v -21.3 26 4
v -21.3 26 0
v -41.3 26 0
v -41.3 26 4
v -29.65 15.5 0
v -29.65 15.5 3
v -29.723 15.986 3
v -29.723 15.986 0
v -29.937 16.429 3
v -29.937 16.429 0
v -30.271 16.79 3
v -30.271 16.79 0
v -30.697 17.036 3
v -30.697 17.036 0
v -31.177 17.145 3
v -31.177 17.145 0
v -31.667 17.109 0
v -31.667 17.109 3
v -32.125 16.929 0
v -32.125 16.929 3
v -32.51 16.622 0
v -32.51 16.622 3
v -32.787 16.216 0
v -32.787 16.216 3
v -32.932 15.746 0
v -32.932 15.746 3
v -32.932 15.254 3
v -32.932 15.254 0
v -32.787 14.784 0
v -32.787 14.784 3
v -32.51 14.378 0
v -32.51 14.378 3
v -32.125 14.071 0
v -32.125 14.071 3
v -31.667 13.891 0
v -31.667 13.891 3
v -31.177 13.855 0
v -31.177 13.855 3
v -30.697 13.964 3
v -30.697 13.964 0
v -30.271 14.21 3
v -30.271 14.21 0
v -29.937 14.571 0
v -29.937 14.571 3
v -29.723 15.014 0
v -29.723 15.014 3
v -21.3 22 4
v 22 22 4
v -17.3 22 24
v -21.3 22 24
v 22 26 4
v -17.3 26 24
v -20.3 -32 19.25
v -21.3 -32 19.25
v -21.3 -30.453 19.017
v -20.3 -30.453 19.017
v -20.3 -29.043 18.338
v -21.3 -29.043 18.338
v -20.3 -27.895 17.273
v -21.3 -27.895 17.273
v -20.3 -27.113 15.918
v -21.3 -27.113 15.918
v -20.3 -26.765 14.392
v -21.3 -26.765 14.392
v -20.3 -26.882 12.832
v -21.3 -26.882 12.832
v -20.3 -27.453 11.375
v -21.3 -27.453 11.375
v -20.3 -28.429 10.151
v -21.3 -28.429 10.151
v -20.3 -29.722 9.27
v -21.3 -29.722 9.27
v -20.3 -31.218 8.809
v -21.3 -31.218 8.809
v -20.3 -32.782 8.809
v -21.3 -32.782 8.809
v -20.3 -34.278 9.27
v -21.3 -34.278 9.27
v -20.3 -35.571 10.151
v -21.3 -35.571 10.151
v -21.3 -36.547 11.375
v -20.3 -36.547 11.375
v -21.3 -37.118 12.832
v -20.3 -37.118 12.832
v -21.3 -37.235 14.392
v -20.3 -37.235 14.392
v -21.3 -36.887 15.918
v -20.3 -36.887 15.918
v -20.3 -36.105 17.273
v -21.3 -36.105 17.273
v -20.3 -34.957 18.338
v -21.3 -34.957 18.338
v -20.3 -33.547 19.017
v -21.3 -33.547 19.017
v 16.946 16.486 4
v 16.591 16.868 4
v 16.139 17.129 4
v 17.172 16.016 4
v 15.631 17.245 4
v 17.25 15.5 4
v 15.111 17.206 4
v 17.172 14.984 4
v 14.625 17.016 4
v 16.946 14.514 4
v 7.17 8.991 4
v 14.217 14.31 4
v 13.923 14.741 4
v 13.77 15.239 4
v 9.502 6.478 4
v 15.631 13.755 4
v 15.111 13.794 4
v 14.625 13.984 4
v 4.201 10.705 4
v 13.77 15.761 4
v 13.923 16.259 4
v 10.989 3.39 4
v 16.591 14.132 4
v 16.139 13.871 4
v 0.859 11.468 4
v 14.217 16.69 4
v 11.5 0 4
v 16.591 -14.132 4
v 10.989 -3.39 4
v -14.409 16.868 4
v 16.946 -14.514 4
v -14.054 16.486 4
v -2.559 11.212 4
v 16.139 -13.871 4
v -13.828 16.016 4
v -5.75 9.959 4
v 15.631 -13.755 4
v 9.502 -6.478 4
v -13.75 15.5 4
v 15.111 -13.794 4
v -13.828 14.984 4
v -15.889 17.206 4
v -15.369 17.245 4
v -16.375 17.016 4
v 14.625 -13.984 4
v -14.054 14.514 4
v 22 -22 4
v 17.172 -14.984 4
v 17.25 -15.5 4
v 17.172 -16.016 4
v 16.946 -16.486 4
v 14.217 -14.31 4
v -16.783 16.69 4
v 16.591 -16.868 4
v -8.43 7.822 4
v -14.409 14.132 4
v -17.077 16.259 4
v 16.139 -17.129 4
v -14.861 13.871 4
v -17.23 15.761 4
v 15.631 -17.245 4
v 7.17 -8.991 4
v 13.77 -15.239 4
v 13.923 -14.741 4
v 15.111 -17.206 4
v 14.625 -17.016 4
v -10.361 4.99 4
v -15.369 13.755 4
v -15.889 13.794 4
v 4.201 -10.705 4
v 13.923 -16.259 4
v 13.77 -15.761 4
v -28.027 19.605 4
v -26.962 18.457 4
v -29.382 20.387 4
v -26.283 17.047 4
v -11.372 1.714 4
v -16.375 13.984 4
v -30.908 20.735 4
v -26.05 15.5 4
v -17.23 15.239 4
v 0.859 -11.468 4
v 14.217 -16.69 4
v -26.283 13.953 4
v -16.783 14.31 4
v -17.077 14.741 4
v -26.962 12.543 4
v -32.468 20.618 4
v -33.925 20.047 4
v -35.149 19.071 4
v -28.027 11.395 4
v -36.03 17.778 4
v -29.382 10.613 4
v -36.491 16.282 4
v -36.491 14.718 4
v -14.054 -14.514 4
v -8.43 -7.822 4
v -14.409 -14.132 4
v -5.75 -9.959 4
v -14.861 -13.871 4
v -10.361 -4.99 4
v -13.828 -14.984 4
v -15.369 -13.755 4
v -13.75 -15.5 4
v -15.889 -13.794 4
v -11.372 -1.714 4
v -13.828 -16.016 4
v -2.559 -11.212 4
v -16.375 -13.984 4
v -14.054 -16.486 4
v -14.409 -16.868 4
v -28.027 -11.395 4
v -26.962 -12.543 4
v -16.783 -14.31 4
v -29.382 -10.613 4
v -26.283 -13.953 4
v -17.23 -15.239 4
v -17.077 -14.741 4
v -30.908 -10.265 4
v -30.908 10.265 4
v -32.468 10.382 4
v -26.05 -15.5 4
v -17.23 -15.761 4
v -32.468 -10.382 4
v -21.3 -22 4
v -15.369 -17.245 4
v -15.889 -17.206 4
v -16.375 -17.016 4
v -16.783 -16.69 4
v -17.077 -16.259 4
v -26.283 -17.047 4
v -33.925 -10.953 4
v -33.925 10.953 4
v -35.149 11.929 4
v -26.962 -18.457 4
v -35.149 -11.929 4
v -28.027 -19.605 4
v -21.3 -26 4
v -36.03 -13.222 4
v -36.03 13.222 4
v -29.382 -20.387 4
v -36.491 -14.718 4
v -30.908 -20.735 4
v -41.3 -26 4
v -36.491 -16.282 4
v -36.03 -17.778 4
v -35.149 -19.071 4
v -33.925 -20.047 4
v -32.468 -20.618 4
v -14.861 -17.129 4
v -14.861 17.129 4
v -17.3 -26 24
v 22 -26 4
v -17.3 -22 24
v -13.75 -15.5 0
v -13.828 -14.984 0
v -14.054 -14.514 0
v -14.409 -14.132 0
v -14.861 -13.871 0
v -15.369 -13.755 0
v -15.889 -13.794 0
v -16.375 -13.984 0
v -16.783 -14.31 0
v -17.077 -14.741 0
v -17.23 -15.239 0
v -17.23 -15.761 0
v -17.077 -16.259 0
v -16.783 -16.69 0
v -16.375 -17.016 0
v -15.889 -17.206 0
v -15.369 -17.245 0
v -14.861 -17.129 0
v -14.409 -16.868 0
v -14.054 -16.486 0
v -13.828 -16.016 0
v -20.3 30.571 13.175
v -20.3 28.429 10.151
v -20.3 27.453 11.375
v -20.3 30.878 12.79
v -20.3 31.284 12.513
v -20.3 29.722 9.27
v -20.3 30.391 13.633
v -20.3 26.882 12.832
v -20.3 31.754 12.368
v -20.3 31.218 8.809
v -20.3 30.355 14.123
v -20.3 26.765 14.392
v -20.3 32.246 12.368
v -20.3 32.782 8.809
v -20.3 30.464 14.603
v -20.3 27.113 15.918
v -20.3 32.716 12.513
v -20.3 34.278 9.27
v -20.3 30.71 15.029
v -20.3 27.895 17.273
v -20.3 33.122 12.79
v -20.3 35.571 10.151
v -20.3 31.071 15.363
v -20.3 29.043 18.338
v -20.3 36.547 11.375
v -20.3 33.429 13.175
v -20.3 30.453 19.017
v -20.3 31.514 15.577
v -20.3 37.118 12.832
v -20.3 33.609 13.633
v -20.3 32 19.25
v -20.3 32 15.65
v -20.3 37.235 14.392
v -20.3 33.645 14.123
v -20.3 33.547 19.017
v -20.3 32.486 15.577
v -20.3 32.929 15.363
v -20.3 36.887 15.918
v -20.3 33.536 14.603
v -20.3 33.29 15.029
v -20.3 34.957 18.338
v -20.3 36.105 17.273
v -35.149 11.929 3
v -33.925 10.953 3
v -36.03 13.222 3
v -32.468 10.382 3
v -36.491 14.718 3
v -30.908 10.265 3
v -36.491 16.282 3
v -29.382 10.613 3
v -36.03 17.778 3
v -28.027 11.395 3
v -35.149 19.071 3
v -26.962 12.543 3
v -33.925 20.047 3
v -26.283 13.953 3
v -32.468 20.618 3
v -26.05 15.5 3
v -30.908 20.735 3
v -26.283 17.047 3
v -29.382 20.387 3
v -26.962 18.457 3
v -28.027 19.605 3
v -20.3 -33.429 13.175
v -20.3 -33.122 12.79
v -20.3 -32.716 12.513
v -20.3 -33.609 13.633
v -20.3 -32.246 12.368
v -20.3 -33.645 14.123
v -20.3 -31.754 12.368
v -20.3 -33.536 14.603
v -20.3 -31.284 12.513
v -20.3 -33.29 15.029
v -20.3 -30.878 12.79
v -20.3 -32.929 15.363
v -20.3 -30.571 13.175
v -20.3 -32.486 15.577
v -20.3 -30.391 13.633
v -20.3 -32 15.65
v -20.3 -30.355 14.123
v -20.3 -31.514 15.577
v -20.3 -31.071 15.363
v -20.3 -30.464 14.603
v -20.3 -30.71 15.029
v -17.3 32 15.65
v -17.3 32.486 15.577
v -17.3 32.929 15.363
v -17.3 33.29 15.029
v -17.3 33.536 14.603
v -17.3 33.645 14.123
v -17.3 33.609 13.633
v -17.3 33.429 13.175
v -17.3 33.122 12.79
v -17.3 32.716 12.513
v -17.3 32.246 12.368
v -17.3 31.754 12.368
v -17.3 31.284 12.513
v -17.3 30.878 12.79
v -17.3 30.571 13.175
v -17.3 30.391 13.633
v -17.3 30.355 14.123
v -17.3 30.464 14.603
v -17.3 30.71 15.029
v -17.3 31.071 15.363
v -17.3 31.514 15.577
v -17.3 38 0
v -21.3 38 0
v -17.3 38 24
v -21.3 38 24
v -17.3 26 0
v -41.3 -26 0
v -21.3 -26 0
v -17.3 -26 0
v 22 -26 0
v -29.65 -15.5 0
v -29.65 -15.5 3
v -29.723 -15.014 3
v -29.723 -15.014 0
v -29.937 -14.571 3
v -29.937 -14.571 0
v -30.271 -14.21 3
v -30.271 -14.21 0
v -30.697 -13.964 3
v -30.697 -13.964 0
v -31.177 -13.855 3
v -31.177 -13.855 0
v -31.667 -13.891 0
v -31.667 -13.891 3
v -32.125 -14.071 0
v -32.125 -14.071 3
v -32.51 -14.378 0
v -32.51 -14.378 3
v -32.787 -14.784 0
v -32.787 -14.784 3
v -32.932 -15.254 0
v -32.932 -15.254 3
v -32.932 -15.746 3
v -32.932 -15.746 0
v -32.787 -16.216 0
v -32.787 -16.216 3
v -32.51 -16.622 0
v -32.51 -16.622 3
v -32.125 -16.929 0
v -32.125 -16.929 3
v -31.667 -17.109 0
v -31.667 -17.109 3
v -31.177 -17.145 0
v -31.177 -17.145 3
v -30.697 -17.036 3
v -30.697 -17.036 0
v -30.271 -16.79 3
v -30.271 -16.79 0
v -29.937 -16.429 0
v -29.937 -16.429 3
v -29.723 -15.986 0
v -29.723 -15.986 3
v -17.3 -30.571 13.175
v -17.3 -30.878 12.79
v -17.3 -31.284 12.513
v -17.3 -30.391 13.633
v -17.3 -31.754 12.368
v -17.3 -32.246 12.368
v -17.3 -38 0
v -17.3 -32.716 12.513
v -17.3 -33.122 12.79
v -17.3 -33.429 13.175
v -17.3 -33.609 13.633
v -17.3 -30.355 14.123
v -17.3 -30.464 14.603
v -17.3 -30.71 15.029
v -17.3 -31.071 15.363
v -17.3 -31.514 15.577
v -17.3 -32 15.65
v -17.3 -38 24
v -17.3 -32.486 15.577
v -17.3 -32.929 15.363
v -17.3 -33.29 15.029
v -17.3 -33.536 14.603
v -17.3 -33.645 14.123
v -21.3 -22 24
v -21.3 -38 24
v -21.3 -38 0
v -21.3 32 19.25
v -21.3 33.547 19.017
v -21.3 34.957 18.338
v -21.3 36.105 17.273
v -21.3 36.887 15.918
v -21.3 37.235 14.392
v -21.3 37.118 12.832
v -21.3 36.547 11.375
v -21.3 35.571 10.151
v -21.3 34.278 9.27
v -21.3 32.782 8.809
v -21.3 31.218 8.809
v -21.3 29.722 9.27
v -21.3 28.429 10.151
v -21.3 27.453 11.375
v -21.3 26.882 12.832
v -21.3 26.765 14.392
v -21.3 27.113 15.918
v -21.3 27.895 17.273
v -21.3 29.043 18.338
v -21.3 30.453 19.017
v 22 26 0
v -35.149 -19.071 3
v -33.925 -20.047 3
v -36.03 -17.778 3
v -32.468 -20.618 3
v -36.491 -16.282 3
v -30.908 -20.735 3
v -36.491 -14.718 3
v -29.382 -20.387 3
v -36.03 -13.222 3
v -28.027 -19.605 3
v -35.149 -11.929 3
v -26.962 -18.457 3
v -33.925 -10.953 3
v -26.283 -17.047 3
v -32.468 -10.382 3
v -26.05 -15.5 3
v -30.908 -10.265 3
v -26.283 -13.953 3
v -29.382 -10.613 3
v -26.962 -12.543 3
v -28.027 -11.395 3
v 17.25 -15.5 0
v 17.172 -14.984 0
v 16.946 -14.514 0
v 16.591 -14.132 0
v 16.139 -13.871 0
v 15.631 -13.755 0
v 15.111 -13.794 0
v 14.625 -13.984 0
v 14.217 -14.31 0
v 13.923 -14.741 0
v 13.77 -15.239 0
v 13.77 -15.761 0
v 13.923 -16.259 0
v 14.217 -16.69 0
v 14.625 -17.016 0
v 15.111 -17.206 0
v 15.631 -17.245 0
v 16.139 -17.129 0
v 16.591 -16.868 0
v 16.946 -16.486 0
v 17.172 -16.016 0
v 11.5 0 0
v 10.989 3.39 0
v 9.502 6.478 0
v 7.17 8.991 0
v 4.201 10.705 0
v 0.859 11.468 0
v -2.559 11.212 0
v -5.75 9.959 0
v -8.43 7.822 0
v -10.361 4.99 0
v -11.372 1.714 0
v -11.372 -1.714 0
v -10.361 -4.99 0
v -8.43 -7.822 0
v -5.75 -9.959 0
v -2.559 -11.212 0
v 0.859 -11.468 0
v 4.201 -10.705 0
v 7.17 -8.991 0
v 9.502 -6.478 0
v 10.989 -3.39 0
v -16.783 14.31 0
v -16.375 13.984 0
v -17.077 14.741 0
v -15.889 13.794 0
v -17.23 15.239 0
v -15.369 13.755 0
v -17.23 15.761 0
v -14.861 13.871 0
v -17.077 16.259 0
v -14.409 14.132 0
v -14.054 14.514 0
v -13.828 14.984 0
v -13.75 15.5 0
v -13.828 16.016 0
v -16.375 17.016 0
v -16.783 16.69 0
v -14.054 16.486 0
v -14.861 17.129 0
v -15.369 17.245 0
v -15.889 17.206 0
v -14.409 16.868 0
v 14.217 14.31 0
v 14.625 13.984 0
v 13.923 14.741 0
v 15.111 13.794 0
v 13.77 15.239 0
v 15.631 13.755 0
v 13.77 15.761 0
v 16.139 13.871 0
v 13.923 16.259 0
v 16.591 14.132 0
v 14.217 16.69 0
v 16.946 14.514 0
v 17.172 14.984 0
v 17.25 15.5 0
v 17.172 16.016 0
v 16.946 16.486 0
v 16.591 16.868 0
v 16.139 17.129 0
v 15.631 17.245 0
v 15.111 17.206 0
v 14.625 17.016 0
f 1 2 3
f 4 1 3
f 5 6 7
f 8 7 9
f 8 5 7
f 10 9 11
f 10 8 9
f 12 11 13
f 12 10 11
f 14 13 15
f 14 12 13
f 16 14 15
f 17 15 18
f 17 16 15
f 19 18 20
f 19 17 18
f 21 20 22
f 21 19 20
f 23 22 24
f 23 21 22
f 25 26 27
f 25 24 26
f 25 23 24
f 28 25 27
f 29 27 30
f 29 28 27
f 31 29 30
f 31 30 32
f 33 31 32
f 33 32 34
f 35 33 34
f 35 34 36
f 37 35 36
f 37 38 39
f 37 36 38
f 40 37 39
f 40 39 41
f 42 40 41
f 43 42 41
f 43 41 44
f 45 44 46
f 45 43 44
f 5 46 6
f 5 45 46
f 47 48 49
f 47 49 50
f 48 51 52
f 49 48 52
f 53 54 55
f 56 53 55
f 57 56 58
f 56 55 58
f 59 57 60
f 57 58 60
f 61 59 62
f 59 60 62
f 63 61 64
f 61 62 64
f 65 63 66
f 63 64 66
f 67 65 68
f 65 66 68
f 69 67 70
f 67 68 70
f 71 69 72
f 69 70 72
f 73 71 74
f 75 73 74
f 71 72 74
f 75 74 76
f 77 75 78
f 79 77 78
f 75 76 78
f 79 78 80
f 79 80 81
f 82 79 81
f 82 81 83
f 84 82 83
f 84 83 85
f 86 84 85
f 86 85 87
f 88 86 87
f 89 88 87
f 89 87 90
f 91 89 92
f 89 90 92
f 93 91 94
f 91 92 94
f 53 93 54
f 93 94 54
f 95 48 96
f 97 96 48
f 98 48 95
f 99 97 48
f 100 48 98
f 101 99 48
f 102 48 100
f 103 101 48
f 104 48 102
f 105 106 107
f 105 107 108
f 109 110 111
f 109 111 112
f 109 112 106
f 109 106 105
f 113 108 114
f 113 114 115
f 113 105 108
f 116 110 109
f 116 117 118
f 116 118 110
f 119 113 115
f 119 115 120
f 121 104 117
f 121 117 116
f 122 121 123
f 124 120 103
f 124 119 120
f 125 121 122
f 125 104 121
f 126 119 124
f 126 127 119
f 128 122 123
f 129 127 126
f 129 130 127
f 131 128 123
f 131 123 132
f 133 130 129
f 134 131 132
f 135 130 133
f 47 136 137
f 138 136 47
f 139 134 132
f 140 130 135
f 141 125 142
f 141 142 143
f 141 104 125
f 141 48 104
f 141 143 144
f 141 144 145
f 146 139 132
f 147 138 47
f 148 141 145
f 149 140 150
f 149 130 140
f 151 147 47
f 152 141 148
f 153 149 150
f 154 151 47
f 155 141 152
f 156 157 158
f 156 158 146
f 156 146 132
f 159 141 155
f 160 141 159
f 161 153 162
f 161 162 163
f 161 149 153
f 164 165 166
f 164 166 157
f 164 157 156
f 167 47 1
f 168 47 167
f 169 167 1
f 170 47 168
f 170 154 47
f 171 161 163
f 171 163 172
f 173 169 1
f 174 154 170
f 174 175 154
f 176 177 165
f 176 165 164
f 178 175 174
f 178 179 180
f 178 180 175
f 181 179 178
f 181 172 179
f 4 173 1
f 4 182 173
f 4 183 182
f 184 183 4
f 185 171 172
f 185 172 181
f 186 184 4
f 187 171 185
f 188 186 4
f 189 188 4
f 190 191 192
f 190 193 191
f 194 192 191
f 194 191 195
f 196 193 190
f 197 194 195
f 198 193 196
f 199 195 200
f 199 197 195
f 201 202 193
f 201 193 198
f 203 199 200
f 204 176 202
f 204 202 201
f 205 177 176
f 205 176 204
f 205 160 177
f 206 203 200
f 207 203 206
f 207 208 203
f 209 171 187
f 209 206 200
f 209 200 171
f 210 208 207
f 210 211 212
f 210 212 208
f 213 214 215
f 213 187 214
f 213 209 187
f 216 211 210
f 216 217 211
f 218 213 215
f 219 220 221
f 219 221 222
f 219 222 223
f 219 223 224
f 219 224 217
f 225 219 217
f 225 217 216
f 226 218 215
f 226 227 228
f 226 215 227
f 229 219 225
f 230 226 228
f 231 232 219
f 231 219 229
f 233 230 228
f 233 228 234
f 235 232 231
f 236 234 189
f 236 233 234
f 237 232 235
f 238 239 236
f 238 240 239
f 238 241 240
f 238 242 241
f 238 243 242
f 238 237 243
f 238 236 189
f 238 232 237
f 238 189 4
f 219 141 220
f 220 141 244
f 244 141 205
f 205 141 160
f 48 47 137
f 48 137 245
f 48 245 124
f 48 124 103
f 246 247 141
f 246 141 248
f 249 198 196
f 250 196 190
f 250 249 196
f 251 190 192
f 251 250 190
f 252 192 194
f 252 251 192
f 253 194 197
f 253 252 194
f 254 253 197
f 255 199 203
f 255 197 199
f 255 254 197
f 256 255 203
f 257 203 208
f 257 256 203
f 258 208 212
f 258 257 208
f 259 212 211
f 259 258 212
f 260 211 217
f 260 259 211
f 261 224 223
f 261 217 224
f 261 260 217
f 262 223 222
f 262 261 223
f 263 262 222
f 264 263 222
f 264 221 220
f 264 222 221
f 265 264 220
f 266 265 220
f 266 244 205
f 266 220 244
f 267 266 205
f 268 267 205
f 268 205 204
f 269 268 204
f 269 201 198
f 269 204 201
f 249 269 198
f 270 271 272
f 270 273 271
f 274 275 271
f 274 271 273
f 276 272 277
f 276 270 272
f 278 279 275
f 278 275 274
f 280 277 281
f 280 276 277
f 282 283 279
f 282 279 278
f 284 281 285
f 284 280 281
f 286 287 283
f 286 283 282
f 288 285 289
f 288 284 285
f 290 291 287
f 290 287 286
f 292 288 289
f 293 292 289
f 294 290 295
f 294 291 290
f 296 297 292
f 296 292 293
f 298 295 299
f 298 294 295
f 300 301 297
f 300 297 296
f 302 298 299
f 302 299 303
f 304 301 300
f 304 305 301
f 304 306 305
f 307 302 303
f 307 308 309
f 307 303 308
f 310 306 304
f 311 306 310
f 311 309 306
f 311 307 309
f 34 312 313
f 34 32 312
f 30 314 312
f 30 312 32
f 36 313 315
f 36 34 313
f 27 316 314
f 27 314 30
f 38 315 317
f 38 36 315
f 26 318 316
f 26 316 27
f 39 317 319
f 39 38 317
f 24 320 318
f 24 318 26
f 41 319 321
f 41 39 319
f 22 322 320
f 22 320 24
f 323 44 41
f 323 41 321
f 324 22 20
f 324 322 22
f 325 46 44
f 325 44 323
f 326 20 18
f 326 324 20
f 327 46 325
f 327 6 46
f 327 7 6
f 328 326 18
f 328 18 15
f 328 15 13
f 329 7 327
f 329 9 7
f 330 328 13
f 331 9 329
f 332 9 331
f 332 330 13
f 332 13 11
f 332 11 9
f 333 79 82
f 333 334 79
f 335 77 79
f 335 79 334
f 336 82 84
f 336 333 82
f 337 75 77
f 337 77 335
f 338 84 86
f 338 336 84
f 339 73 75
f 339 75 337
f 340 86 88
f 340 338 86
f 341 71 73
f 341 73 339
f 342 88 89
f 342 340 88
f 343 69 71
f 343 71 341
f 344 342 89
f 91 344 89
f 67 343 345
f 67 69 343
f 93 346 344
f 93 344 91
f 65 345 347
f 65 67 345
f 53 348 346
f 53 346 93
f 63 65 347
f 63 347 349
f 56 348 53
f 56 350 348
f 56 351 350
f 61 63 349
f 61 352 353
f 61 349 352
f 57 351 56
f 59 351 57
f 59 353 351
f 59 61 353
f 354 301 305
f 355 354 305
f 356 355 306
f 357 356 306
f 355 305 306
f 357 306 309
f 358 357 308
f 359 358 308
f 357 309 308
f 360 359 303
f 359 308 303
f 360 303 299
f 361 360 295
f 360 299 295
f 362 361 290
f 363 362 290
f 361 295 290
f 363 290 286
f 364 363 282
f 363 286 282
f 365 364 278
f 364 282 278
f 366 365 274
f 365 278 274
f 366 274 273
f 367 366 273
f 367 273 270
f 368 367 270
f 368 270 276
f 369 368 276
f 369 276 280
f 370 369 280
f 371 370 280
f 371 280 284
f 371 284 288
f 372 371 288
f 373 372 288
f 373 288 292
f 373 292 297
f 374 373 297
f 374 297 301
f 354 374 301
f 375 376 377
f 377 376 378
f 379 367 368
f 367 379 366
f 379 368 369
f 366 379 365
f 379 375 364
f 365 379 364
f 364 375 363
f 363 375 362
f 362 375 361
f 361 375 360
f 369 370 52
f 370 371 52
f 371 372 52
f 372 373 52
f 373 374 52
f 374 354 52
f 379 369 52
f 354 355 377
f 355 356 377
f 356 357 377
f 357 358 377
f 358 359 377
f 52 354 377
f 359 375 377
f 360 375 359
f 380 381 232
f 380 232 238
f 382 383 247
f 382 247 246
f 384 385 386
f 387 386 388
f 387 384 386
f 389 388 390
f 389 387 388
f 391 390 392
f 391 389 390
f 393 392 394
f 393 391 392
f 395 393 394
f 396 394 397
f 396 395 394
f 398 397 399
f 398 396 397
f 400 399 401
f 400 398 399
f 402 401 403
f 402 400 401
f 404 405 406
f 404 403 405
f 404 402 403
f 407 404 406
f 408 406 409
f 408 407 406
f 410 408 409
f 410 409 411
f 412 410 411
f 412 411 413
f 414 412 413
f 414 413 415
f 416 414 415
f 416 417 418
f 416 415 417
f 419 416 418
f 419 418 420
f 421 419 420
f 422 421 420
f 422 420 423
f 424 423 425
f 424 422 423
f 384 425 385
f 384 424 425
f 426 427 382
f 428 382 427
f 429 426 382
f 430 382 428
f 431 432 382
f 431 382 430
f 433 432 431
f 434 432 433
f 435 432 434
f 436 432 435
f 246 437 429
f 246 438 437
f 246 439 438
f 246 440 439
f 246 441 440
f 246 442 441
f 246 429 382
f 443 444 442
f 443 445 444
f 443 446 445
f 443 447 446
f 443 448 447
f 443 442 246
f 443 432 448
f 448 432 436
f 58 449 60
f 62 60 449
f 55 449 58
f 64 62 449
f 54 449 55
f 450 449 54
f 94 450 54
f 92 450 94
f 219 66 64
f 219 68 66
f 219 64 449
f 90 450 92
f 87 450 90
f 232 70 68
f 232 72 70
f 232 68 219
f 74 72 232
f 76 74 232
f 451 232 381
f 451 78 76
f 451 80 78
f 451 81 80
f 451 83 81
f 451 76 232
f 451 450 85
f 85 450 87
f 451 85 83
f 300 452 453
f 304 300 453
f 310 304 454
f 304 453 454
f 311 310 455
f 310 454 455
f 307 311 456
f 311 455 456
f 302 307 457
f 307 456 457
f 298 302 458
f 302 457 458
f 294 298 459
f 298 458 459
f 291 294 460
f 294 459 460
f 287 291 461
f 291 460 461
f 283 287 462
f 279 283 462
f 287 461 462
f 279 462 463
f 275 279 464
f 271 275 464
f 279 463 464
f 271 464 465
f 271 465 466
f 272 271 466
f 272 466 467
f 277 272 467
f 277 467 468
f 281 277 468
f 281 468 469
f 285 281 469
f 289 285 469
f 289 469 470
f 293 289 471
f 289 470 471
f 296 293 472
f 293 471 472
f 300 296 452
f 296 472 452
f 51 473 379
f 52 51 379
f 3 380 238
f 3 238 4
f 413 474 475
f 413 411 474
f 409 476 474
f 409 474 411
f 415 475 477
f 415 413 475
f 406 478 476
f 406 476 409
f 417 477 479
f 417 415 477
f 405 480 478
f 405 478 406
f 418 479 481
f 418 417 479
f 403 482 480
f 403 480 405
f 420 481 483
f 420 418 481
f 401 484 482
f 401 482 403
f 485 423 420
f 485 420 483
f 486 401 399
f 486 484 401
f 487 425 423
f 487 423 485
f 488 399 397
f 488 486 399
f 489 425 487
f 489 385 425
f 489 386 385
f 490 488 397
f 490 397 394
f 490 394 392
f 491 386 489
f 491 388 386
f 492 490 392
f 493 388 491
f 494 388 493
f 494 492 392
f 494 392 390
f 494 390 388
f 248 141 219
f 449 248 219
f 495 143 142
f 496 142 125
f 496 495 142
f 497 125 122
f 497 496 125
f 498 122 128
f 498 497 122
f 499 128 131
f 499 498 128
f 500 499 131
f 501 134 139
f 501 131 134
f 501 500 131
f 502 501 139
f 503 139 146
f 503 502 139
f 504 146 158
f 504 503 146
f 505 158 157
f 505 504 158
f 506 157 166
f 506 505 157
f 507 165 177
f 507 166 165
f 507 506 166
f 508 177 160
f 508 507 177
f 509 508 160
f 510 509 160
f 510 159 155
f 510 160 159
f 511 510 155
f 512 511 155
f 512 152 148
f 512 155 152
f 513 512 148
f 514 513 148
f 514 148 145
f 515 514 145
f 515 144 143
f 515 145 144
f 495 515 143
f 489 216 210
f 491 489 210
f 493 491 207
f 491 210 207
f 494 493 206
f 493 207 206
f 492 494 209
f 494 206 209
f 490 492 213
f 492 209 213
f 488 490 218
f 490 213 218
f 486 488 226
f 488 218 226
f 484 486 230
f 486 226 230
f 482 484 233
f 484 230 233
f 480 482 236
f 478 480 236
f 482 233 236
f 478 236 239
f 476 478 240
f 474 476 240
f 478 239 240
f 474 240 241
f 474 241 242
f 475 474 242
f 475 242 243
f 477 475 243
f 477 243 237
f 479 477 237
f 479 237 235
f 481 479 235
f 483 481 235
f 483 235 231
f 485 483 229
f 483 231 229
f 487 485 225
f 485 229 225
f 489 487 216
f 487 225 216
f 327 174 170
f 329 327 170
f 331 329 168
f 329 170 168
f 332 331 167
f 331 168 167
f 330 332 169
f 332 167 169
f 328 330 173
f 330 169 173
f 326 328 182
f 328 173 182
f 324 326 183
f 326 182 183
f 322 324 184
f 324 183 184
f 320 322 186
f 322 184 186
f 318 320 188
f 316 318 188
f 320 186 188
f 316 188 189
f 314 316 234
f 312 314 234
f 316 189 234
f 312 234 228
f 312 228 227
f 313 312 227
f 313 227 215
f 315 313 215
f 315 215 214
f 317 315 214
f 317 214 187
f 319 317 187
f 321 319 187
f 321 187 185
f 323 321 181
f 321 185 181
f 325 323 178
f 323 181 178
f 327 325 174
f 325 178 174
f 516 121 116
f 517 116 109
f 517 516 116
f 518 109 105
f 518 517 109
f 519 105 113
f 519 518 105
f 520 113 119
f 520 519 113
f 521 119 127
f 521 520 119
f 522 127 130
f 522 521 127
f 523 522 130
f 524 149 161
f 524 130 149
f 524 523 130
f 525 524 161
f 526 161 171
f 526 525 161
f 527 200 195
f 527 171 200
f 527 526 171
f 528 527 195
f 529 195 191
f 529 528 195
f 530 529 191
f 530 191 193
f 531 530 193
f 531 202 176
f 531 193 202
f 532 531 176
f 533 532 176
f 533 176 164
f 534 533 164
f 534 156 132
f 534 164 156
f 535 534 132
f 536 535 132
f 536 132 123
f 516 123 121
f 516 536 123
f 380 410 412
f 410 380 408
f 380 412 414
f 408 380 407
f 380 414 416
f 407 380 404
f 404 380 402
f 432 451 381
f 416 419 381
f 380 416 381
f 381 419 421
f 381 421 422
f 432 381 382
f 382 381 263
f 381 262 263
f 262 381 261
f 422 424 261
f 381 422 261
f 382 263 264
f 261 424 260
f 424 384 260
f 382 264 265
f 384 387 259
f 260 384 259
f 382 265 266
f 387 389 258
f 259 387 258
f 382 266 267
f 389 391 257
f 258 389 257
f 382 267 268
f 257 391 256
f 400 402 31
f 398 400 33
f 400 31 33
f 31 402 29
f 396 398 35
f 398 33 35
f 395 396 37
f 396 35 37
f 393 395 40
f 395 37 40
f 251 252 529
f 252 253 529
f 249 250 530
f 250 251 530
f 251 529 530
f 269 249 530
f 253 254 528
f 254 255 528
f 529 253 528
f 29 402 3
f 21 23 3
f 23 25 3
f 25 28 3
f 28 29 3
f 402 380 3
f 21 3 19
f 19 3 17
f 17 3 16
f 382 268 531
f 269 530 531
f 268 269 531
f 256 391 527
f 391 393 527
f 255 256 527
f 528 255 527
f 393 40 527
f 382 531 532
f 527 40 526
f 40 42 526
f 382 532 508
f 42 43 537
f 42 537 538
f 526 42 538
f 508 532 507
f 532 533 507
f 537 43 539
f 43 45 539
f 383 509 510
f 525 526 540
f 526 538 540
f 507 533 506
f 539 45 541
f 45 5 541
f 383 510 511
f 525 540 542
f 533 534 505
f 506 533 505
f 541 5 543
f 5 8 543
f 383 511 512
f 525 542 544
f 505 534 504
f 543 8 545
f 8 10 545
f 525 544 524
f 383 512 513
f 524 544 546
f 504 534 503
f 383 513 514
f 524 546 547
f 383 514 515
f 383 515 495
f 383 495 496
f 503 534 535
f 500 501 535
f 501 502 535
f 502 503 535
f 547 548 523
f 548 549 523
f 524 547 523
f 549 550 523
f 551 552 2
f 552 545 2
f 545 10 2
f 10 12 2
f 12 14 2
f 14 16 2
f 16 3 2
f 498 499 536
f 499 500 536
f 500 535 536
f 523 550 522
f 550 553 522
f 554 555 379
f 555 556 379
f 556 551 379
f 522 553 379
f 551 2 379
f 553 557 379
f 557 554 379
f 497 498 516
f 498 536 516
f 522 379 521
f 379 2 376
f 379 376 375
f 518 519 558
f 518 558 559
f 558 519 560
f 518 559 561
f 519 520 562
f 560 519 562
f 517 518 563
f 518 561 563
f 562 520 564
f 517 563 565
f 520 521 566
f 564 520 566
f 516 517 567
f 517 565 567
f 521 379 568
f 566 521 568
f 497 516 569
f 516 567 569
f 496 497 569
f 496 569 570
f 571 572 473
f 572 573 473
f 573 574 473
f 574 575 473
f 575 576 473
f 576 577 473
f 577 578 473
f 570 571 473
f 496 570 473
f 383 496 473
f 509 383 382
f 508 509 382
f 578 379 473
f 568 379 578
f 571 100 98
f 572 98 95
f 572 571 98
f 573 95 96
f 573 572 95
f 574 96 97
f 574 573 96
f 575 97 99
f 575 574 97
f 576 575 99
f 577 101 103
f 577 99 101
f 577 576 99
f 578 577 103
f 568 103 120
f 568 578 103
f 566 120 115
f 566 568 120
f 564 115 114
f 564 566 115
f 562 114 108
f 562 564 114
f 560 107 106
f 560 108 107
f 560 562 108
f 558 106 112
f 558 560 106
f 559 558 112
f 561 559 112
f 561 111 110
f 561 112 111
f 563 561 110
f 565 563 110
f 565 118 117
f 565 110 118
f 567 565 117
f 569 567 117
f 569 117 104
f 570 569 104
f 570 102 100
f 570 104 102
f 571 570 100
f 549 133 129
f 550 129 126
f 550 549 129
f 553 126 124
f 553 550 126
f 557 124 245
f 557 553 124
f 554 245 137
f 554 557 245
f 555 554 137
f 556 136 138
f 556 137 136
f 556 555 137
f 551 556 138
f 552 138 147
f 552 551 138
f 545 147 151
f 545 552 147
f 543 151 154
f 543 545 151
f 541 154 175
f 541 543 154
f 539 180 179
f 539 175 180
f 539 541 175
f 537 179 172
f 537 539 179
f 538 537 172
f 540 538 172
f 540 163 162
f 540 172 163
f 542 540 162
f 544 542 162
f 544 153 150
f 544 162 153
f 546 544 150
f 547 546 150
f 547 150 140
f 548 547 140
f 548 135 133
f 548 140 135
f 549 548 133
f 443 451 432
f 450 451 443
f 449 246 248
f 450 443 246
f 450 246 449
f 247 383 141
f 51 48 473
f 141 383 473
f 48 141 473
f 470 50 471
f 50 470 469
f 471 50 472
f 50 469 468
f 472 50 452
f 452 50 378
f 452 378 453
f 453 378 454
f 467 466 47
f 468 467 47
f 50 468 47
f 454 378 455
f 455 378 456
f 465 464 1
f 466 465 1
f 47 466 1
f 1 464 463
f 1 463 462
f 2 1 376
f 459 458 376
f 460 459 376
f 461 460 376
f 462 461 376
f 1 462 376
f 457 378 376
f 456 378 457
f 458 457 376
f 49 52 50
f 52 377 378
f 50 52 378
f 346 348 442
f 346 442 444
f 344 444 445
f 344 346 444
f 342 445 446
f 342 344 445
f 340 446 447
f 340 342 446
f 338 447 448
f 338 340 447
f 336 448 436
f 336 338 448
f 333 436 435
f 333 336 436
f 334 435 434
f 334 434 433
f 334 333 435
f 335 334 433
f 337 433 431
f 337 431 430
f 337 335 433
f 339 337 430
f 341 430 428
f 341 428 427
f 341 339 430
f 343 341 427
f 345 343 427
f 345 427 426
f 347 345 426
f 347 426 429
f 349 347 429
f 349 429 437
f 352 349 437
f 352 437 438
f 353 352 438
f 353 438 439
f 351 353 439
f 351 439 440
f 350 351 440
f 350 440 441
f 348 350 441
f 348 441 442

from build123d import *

# Parameters (mm, degrees)
ESBO_O1_W                  = 63.3
ESBO_O1_H                  = 52
ESBO_O1_R                  = 11.5
ESBO_O1_R_2                = 1.75
ESBO_O1_R_3                = 1.65
RESSALTO_EXTRUS_O1_DEPTH   = 25
ESBO_O2_W                  = 13.3
ESBO_O2_H                  = 21
CORTE_EXTRUS_O1_DEPTH      = 27
CORTE_EXTRUS_O1_DEPTH_BACK = 27
RESSALTO_EXTRUS_O2_DEPTH   = 4
ESBO_O4_W                  = 24
ESBO_O4_H                  = 16
ESBO_O4_R                  = 1.65
RESSALTO_EXTRUS_O3_DEPTH   = 4
ESBO_O5_R                  = 5.25
CORTE_EXTRUS_O2_DEPTH      = 1
ESBO_O6_R                  = 5.25
CORTE_EXTRUS_O3_DEPTH      = 1


with BuildPart() as part:
    # Esboço1 → Ressalto-extrusão1 (new body)
    with BuildSketch(Plane.XY):
        with Locations((-9.65, 0)):
            Rectangle(ESBO_O1_W, ESBO_O1_H)
        Circle(ESBO_O1_R, mode=Mode.SUBTRACT)
        with Locations((-15.5, 15.5)):
            Circle(ESBO_O1_R_2, mode=Mode.SUBTRACT)
        with Locations((15.5, 15.5)):
            Circle(ESBO_O1_R_2, mode=Mode.SUBTRACT)
        with Locations((15.5, -15.5)):
            Circle(ESBO_O1_R_2, mode=Mode.SUBTRACT)
        with Locations((-15.5, -15.5)):
            Circle(ESBO_O1_R_2, mode=Mode.SUBTRACT)
        with Locations((-31.3, -15.5)):
            Circle(ESBO_O1_R_3, mode=Mode.SUBTRACT)
        with Locations((-31.3, 15.5)):
            Circle(ESBO_O1_R_3, mode=Mode.SUBTRACT)
    extrude(amount=RESSALTO_EXTRUS_O1_DEPTH)

    # Esboço2 → Corte-extrusão1 (cut, two sides)
    with BuildSketch(Plane(origin=(0, 0, 0), x_dir=(1, 0, 0), z_dir=(0, 1, 0))) as corte_extrus_o1_sk:
        with Locations((-34.65, -14.5)):
            Rectangle(ESBO_O2_W, ESBO_O2_H)
        Polygon((-23, -25), (22, -25), (22, -4), align=None)
        Polygon((-23, -25), (22, -4), (-23, -4), (-28, -4), (-28, -25), align=None)
    extrude(amount=CORTE_EXTRUS_O1_DEPTH, mode=Mode.SUBTRACT)
    extrude(corte_extrus_o1_sk.sketch, amount=-CORTE_EXTRUS_O1_DEPTH_BACK, mode=Mode.SUBTRACT)

    # Esboço3 → Ressalto-extrusão2 (add)
    with BuildSketch(Plane(origin=(0, 26, 0), x_dir=(1, 0, 0), z_dir=(0, 1, 0))):
        Polygon((22, -4), (-17.3, -24), (-21.3, -24), (-21.3, -4), align=None)
    ressalto_extrus_o2 = extrude(amount=-RESSALTO_EXTRUS_O2_DEPTH)

    # Esboço4 → Ressalto-extrusão3 (add)
    with BuildSketch(Plane.ZY.offset(21.3)):
        with Locations((12, 30)):
            Rectangle(ESBO_O4_W, ESBO_O4_H)
        with Locations((14, 32)):
            Circle(ESBO_O4_R, mode=Mode.SUBTRACT)
    ressalto_extrus_o3 = extrude(amount=-RESSALTO_EXTRUS_O3_DEPTH)

    # Espelhar1: Ressalto-extrusão2, Ressalto-extrusão3 across plane
    add(ressalto_extrus_o2.mirror(Plane.ZX))
    add(ressalto_extrus_o3.mirror(Plane.ZX))

    # Esboço5 → Corte-extrusão2 (cut)
    with BuildSketch(Plane.ZY.offset(21.3)):
        with Locations((14, -32)):
            Circle(ESBO_O5_R)
        with Locations((14, 32)):
            Circle(ESBO_O5_R)
    extrude(amount=-CORTE_EXTRUS_O2_DEPTH, mode=Mode.SUBTRACT)

    # Esboço6 → Corte-extrusão3 (cut)
    with BuildSketch(Plane.XY.offset(4)):
        with Locations((-31.3, 15.5)):
            Circle(ESBO_O6_R)
        with Locations((-31.3, -15.5)):
            Circle(ESBO_O6_R)
    extrude(amount=-CORTE_EXTRUS_O3_DEPTH, mode=Mode.SUBTRACT)


solid = part.part
